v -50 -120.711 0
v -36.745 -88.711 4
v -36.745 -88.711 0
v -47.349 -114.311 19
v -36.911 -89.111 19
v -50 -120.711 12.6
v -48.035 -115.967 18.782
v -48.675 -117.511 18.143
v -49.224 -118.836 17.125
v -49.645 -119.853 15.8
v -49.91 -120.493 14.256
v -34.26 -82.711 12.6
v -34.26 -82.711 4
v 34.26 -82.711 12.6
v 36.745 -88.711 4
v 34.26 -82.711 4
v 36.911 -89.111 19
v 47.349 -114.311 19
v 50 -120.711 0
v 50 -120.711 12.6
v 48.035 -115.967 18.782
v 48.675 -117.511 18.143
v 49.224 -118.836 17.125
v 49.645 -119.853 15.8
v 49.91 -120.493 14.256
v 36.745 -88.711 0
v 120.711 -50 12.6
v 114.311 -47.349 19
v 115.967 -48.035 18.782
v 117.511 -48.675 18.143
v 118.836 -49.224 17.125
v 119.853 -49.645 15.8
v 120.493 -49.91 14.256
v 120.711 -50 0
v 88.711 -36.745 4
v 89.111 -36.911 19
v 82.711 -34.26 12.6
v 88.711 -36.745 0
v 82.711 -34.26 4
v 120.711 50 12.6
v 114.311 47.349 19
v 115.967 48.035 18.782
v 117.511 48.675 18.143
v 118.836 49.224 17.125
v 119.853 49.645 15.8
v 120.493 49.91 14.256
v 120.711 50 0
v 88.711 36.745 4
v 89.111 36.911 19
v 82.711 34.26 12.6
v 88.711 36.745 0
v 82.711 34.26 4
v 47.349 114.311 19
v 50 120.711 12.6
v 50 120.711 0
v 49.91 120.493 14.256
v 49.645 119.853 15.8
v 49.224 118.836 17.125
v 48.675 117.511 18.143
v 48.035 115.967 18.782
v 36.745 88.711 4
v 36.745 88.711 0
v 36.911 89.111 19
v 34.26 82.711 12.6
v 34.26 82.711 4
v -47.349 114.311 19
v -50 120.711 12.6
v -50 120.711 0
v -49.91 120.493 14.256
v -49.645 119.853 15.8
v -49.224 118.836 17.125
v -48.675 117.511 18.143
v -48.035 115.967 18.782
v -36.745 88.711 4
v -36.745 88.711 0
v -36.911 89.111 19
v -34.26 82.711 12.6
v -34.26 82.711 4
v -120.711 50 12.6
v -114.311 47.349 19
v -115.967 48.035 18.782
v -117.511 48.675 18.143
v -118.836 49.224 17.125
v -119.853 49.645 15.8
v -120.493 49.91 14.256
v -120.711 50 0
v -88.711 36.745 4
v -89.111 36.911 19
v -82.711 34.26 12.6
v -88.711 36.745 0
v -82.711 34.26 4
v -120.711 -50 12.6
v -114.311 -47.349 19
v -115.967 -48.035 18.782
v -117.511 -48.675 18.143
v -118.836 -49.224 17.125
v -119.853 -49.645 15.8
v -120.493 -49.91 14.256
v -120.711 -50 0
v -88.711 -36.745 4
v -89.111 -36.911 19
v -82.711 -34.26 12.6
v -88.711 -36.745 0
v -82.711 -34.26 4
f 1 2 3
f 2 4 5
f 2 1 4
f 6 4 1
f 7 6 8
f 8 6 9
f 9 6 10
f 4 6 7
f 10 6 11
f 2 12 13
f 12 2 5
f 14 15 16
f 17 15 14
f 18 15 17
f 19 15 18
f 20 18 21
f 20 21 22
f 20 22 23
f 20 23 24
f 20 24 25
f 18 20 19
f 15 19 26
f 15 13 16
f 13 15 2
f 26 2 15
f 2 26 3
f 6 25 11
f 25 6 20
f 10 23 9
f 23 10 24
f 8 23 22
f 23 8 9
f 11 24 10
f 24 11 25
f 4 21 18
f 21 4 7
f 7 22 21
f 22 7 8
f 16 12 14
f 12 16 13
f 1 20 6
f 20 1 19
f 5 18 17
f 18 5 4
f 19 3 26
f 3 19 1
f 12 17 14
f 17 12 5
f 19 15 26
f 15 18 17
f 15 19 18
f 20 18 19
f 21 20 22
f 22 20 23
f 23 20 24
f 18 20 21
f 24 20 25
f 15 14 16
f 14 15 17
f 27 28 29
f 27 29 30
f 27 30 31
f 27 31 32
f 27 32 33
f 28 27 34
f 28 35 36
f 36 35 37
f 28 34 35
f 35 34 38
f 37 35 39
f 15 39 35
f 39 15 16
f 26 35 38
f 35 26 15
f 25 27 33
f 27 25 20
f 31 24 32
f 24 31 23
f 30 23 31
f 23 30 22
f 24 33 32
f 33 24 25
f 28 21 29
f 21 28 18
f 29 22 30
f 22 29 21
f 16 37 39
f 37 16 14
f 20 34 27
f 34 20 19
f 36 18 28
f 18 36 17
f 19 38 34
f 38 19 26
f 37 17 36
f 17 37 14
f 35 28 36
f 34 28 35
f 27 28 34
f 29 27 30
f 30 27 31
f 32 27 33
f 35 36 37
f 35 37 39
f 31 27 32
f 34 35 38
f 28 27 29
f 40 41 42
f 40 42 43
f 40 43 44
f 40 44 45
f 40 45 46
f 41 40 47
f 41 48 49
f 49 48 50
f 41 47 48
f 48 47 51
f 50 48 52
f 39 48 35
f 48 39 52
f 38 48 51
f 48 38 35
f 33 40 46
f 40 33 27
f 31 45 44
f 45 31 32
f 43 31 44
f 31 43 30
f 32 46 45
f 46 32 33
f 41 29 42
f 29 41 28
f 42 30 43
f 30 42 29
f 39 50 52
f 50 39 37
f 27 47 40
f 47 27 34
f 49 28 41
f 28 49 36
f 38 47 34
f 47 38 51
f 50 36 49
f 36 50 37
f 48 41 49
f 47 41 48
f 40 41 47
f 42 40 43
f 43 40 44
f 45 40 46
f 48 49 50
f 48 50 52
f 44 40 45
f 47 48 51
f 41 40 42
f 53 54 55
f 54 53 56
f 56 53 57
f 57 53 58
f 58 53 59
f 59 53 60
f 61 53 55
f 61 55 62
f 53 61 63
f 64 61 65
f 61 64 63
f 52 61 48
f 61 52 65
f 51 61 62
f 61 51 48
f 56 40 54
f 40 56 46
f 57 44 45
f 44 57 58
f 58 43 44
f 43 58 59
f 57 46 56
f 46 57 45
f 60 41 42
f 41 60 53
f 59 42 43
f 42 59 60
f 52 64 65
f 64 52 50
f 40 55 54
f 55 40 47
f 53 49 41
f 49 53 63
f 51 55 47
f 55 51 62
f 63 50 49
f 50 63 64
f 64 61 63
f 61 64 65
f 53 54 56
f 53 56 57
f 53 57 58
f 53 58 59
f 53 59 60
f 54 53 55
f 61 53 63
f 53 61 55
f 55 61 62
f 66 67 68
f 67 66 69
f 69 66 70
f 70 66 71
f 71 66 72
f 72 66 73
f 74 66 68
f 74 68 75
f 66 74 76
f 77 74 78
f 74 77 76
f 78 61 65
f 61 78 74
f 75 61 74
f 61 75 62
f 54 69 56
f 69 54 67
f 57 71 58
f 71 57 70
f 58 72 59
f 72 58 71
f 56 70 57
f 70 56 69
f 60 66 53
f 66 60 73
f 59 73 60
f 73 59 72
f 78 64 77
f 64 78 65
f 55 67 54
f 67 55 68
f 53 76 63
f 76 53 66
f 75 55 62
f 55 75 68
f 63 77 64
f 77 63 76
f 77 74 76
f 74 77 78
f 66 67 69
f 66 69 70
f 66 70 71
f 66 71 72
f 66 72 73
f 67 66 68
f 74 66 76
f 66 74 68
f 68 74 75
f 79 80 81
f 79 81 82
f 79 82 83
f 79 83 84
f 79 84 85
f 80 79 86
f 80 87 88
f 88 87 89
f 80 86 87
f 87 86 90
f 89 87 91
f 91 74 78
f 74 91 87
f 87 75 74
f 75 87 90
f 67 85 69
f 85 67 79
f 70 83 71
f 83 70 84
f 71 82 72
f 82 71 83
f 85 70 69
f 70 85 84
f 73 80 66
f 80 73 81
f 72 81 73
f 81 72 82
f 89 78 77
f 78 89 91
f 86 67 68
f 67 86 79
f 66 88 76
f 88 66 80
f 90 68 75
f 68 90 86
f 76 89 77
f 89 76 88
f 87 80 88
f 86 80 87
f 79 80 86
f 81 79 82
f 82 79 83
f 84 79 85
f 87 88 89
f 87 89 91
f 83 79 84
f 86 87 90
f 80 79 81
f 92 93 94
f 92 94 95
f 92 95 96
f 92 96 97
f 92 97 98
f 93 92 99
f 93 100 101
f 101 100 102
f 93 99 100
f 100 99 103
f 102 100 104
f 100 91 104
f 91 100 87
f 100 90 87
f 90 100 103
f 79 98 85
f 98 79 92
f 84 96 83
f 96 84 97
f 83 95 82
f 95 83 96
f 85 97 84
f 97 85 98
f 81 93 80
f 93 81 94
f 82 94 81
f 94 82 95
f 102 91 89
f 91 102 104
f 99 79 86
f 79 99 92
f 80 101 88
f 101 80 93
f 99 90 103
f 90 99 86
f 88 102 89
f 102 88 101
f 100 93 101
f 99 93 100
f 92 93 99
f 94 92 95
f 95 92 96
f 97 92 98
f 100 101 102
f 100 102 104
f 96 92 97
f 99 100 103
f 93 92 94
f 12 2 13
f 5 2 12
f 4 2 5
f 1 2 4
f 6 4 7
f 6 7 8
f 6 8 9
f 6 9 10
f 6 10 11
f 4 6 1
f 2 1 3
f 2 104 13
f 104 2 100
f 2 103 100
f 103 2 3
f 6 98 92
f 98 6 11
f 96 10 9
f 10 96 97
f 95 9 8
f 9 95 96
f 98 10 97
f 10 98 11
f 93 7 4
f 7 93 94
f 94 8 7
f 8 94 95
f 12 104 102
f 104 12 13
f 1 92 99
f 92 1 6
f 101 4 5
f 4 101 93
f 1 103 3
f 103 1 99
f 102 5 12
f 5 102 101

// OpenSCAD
//Polygonal Picture Frame based on Moulding Profile
//DXF Profiles used from this source:
//http://www.hornermillwork.com/cad-library/mouldings
//
//Openscad File created by: David Bunch 6/16/2017
//
/* [Main Variables] */
//A_Type = [108,211,260,3974,3975];
// Type of Frame to Use (DXF files will not work with Customizer)
//Type = -1;       //[-1:Custom,0:N-108.dxf,1:N-211.dxf,2:N-260.dxf,3:N-3974.dxf,4:N-3975]

//1. Units (mm or Inches)
Units = 1;          //[1:mm,25.4:inches]

//2. Number of Sides of Polygon
Sides = 8;          //[2:1:48]
                    //If less than 3 sides, it will draw only 1 Moulding without miter cuts
//3. Length of the outside Mitered side
Ln = 100;                   //[10:2:500]

//4. Optional Base Thickness
B_Thick = 0;     //[0:.5:12]

//5. Default Facet Resolution
I_Res = 24;         //[4:4:96]

/* [Rabbit Cuts] */

//6. Add Rabbit Cut 
Rabbit_Cut_On = 1;      //[0:No,1:Yes]

//7. Width of Rabbit Cut
Rab_Cut_Wid = 6;     //[.5:.5:20]

//8. Depth of Rabbit Cut
Rab_Cut_Depth = 4;   //[.5:.5:20]

//9. Chamfer Top 45 degrees for 3d Printing
Rabbit_Chamfer_ON = 0;  //[0:No,1:Yes]

// -------------------------------------------
// Prefix variables Pr_ are used if Type = -1
// -------------------------------------------

/* [Custom Profiles] */

//10. Width of Profile
Pr_Wi = 38.0;          //[10:1:80]

//11. Thickness of Profile
Pr_Th = 19.0;         //[2:1:50]

/* [Custom Outside Edge Cut] */

//12. Outside Edge Cut (0=None, -1 = Rounded or # of Facets)
Pr_Out_Edge = -1;       //[-1:1:48]
                        //-1 = Rounded Top Edge instead of Chamfer of Fillet Cut

//13. Outside Edge Radius Cut
Pr_O_Rad = 6.4;       //[6.4:.2:16]

//14. Depth of Outside Edge Cut
Pr_O_Depth = 6.4;     //[0:.2:16]

/* [Custom Inside Edge Cut] */

//15. Inside Edge Cut (0=None, -1 = Rounded or # of Facets)
Pr_In_Edge = 4;         //[-1:1:48]
                        //-1 = Rounded Top Edge instead of Chamfer of Fillet Cut

//16. Inside Edge Radius Cut
Pr_I_Rad = 6.4;        //[6.4:.2:16]

//17. Depth of Outside Edge Cut
Pr_I_Depth = 6.4;        //[0:.2:16]

/* [Custom Center Cut] */

//18. Center Cut (0=None or # of Facets)
Pr_Cen = 0;            //[0:1:48]

//19. Inside Edge Radius Cut
Pr_Ce_Rad = 6.4;       //[6.4:.2:16]

//20. Depth of Center Cut
Pr_Ce_Depth = 4;       //[0:.5:12]

/* [Custom Middle towards Outside Cut] */

//21. Between Center & Outside Edge (0=None or # of Facets)
Pr_Mid_Out = 0;         //[0:1:48]
                        //# = Number of facets on Cuts

//22. Middle to Outside Edge Radius Cut
Pr_Mid_O_Rad = 3.2;   //[3.2:.2:12]

//23. Depth of Middle to Outside Edge Cut
Pr_Mid_O_Depth = 1;   //[0:.5:12]

//24. Offset from Center line of Moulding towards Outside Edge
Pr_Mid_O_Offset = 12; //[1:1:40]

/* [Custom Middle towards Inside Cut] */

//25. Between Center & Inside Edge (0=None # of Facets)
Pr_Mid_In = 0;          //[0:1:48]
                        //# = Number of facets on Cuts

//26. Middle to Inside Edge Radius Cut
Pr_Mid_I_Rad = 3.2;    //[3.2:.2:12]  

//27. Depth of Middle to Inside Edge Cut
Pr_Mid_I_Depth = 1;    //[0:.5:12]

//28. Offset from Center line of Moulding towards Inside Edge
Pr_Mid_I_Offset = 10;  //[1:1:40]

/* [Custom Cut along Miter Joint] */

//29. Cut Along Miter Edge (0=None # of Facets)
Pr_Miter_Edge = 0;      //[0:1:48]
                        //# = Number of facets on Cuts

//30. Miter Edge Radius Cut 
Pr_Mit_Rad = 12;      //[6:1:32]  

//31. Depth of Miter Edge Cut
Pr_Mit_Depth = 2;     //[0:.5:12]

//32. Depth of Miter Edge Cut
Pr_Mit_Cut_Len = 200;   //[100:20:400]
// -------------------------------------------

/* [Hidden] */
Type = -1;       //[-1:Custom,0:N-108.dxf,1:N-211.dxf,2:N-260.dxf,3:N-3974.dxf,4:N-3975]
Len = Ln / Units;
Base_Thick = B_Thick / Units;

Rabbit_Cut_Wid = Rab_Cut_Wid / Units;
Rabbit_Cut_Depth = Rab_Cut_Depth / Units;

Pr_Wid = Pr_Wi / Units;
Pr_Thk = Pr_Th / Units;

Pr_Out_Rad = Pr_O_Rad / Units;
Pr_Out_Depth = Pr_O_Depth / Units;

Pr_In_Rad = Pr_I_Rad / Units;
Pr_In_Depth = Pr_I_Depth / Units;

Pr_Mid_Out_Rad = Pr_Mid_O_Rad / Units;
Pr_Mid_Out_Depth = Pr_Mid_O_Depth / Units;
Pr_Mid_Out_Offset = Pr_Mid_O_Offset / Units;

Pr_Cen_Rad = Pr_Ce_Rad / Units;
Pr_Cen_Depth = Pr_Ce_Depth / Units;

Pr_Mid_In_Rad = Pr_Mid_I_Rad / Units;
Pr_Mid_In_Depth = Pr_Mid_I_Depth / Units;
Pr_Mid_In_Offset = Pr_Mid_I_Offset / Units;

Pr_Miter_Rad = Pr_Mit_Rad / Units; 
Pr_Miter_Depth = Pr_Mit_Depth / Units;
Pr_Miter_Cut_Len = Pr_Mit_Cut_Len / Units;
Pr_Miter_Cut_Len = Pr_Mit_Cut_Len / Units;

//Used for Cutting the tops of the Miter joints
Max_Pr_Wid = 200;       //Maximum Width of Profiles
Max_Pr_Thk = 200;       //Maximum Thickness of Profiles

Ang1 = 360 / Sides;
Ang2 = Ang1 / 2;
Ang3 = 90 - Ang2;

Len2 = Len / 2;
Wid2 = Len2 / tan(Ang2);

Rad = Len2 / cos(Ang3);         //Radius of Overall Frame
OD = Rad * 2;                   //Diameter of Overall Frame

Pr_Out_OD = Pr_Out_Rad * 2;     //Outer Edge Profile Cut Diameter
Pr_In_OD = Pr_In_Rad * 2;       //Inner Edge Profile Cut Diameter

//Array of numbered Profiles
A_Type = [108,211,260,3974,3975];
//These are the corresponding Widths of the A_Type profiles
A_Width = [15.875,63.5,32.5438,38.0162,15.1555];

DXF_Name = str("N-",A_Type[abs(Type)],".dxf");
echo(Wid2 = Wid2);
echo(Sides = Sides);
echo(Rad = Rad);
echo(Ang1 = Ang1);
echo(Ang2 = Ang2);
echo(Ang3 = Ang3);
echo(Len2 = Len2);
echo(Type = Type);
echo(DXF_Name = DXF_Name);
$fn = I_Res;

module Moulding()
{
    if (Type != -1)
    {
        translate([0,-Wid2,0])
//Orient Moulding along X-Axis initially
        difference()
        {
            rotate([0,90,0])
            rotate([0,0,90])
            linear_extrude(height = Len, center = true, convexity = 10)
            import(DXF_Name);
            M_Cuts();
            Miter_Cut();
        }
    } else
    {
        translate([0,-Wid2,0])
//Orient Moulding along X-Axis initially
        difference()
        {
            rotate([0,90,0])
            rotate([0,0,90])
            translate([0,0,-Len2])
            cube([Pr_Wid,Pr_Thk,Len]);

            M_Cuts();
            Out_Edge();
            Center_Cut();
            In_Edge();
            Mid_Out_Cut();
            Mid_In_Cut();
            Miter_Cut();
//            translate([10,0,0])
//            {
//                %M_Cuts();
//                %Out_Edge();
//                %Center_Cut();
//                %In_Edge();
//                %Mid_Out_Cut();
//                %Mid_In_Cut();
//            }
        }
    }
}
module M_Cuts()
{

//Only Miter cut if Sides are at least 3 sides
    if (Sides > 2)
    {
        for (m = [0,1])
        {
            mirror([m,0,0])
            translate([-Len2,0,-1])
            rotate([0,0,Ang3])
            cube([Len,Max_Pr_Wid,Max_Pr_Thk]);
        }
    }
    if (Rabbit_Cut_On == 1)
    {
        if (Type == -1)
        {
            Rab_Y_Offset = Pr_Wid - Rabbit_Cut_Wid;
            translate([-Len2-1,Rab_Y_Offset,-1])
            cube([Len + 2,Pr_Wid,Rabbit_Cut_Depth + 1]);
            if (Rabbit_Chamfer_ON == 1)
            {
                translate([0,Pr_Wid,Rabbit_Cut_Depth])
                rotate([0,90,0])
                cylinder(d=Rabbit_Cut_Wid * 2,h = Len + 1,center=true,$fn=4);
            }
        } else
        {
            Profile_Wid = A_Width[Type] / Units;
            echo(Profile_Wid = Profile_Wid);
            Rab_Y_Offset = Profile_Wid - Rabbit_Cut_Wid;
            translate([-Len2 - 1,Rab_Y_Offset,-1])
            cube([Len + 2,Profile_Wid,Rabbit_Cut_Depth + 1]);
            if (Rabbit_Chamfer_ON == 1)
            {
                translate([0,Profile_Wid,Rabbit_Cut_Depth])
                rotate([0,90,0])
                cylinder(d=Rabbit_Cut_Wid * 2,h = Len + 1,center=true,$fn=4);
            }
        }
    }
}
module In_M_Cuts()
{
    for (m = [0,1])
    {
        mirror([m,0,0])
        translate([-Len2-.01,0,-1])
        rotate([0,0,Ang3])
        cube([Len+.02,Max_Pr_Wid,Max_Pr_Thk]);
    }
}
module Out_Edge()
{
    if (Pr_Out_Edge > 0)
    {
        translate([0,0,Pr_Thk + Pr_Out_Rad - Pr_Out_Depth])
        rotate([0,90,0])
        cylinder(d=Pr_Out_OD,h=Len+2,center=true,$fn=Pr_Out_Edge);
    } else if (Pr_Out_Edge == -1)
    {
        translate([0,0,Pr_Thk + Pr_Out_Rad - Pr_Out_Depth])
        rotate([0,90,0])
        translate([-Pr_Out_Rad,-Pr_Out_Rad,0])
        difference()
        {
            translate([0,0,-Len2-1])
            cube([Pr_Out_OD,Pr_Out_OD,Len+2]);
            translate([Pr_Out_OD,Pr_Out_OD,0])
            cylinder(d=Pr_Out_OD,h=Len+4,center=true);
        }        
    }
}
module In_Edge()
{
    if (Pr_In_Edge > 0)
    {
        difference()
        {
            translate([0,Pr_Wid,Pr_Thk + Pr_Out_Rad - Pr_In_Depth])
            rotate([0,90,0])
            cylinder(d=Pr_In_Rad * 2,h=Len+2,center=true,$fn=Pr_In_Edge);
        }
    } else if (Pr_In_Edge == -1)
    {
        translate([0,Pr_Wid,Pr_Thk + Pr_In_Rad - Pr_In_Depth])
        rotate([0,90,0])
        translate([-Pr_In_Rad,-Pr_In_Rad,0])
        difference()
        {
            translate([0,0,-Len2-1])
            cube([Pr_In_OD,Pr_In_OD,Len+2]);
            translate([Pr_In_OD,0,0])
            cylinder(d=Pr_In_OD,h=Len+4,center=true);
        } 
    }
}
module Radius_Cut(P_Rad = Pr_Cen_Rad, P_Depth = Pr_Cen_Depth, P_Res = Pr_Cen, M_Ht = Len)
{
    if (P_Res > 0)
    {
        rotate([0,90,0])
        rotate([0,0,90])
        translate([0,P_Rad,0])
        {
            linear_extrude(height = M_Ht + 1, center = true, convexity = 10)
            translate([-P_Rad,0,0])
            square(P_Rad * 2,false);
            linear_extrude(height = M_Ht + 1, center = true, convexity = 10)
            circle(d=P_Rad * 2, $fn=P_Res);
        }
    }
}
//Cutout along center of Profile
module Center_Cut()
{
    if (Pr_Cen > 0)
    {
        translate([0,Pr_Wid/2,Pr_Thk - Pr_Cen_Depth])
        Radius_Cut(Pr_Cen_Rad,Pr_Cen_Depth,Pr_Cen);
    }
}
//Cutout between Center of Profile & Outside Edge
module Mid_Out_Cut()
{
    if (Pr_Mid_Out > 0)
    {
        translate([0,(Pr_Wid / 2) - Pr_Mid_Out_Offset,Pr_Thk - Pr_Mid_Out_Depth])
        Radius_Cut(Pr_Mid_Out_Rad,Pr_Mid_Out_Depth,Pr_Mid_Out);
    }
}
//Cutout between Center of Profile & Inside Edge
module Mid_In_Cut()
{
    if (Pr_Mid_In > 0)
    {
        translate([0,(Pr_Wid / 2) + Pr_Mid_In_Offset,Pr_Thk - Pr_Mid_In_Depth])
        Radius_Cut(Pr_Mid_In_Rad,Pr_Mid_In_Depth,Pr_Mid_In);
    }
}
//Cutout along the miter joints
module Miter_Cut()
{
    if (Pr_Miter_Edge > 0)
    {
        if (Sides > 2)
        {
            for (m = [0,1])
            {
                mirror([m,0,0])
                translate([-Len2,0,Pr_Thk - Pr_Miter_Depth])
                rotate([0,0,Ang3])
                Radius_Cut(Pr_Miter_Rad,Pr_Miter_Depth,Pr_Miter_Edge,Pr_Miter_Cut_Len);
            }
        }
    }
}
module DrawFinal()
{
    if (Sides < 3)
    {
        Moulding();     //Only draw one moulding
    } else
    {
        union()
        {
//Create all the segmented sides
            for (a = [0:Sides - 1])
            {
                rotate([0,0,a * Ang1])
                Moulding();
            }
            if (Base_Thick != 0)
            {
                rotate([0,0,-(90 + Ang2)])
                cylinder(d=OD,h=Base_Thick,$fn=Sides);
            }
        }
    }
}
DrawFinal();
